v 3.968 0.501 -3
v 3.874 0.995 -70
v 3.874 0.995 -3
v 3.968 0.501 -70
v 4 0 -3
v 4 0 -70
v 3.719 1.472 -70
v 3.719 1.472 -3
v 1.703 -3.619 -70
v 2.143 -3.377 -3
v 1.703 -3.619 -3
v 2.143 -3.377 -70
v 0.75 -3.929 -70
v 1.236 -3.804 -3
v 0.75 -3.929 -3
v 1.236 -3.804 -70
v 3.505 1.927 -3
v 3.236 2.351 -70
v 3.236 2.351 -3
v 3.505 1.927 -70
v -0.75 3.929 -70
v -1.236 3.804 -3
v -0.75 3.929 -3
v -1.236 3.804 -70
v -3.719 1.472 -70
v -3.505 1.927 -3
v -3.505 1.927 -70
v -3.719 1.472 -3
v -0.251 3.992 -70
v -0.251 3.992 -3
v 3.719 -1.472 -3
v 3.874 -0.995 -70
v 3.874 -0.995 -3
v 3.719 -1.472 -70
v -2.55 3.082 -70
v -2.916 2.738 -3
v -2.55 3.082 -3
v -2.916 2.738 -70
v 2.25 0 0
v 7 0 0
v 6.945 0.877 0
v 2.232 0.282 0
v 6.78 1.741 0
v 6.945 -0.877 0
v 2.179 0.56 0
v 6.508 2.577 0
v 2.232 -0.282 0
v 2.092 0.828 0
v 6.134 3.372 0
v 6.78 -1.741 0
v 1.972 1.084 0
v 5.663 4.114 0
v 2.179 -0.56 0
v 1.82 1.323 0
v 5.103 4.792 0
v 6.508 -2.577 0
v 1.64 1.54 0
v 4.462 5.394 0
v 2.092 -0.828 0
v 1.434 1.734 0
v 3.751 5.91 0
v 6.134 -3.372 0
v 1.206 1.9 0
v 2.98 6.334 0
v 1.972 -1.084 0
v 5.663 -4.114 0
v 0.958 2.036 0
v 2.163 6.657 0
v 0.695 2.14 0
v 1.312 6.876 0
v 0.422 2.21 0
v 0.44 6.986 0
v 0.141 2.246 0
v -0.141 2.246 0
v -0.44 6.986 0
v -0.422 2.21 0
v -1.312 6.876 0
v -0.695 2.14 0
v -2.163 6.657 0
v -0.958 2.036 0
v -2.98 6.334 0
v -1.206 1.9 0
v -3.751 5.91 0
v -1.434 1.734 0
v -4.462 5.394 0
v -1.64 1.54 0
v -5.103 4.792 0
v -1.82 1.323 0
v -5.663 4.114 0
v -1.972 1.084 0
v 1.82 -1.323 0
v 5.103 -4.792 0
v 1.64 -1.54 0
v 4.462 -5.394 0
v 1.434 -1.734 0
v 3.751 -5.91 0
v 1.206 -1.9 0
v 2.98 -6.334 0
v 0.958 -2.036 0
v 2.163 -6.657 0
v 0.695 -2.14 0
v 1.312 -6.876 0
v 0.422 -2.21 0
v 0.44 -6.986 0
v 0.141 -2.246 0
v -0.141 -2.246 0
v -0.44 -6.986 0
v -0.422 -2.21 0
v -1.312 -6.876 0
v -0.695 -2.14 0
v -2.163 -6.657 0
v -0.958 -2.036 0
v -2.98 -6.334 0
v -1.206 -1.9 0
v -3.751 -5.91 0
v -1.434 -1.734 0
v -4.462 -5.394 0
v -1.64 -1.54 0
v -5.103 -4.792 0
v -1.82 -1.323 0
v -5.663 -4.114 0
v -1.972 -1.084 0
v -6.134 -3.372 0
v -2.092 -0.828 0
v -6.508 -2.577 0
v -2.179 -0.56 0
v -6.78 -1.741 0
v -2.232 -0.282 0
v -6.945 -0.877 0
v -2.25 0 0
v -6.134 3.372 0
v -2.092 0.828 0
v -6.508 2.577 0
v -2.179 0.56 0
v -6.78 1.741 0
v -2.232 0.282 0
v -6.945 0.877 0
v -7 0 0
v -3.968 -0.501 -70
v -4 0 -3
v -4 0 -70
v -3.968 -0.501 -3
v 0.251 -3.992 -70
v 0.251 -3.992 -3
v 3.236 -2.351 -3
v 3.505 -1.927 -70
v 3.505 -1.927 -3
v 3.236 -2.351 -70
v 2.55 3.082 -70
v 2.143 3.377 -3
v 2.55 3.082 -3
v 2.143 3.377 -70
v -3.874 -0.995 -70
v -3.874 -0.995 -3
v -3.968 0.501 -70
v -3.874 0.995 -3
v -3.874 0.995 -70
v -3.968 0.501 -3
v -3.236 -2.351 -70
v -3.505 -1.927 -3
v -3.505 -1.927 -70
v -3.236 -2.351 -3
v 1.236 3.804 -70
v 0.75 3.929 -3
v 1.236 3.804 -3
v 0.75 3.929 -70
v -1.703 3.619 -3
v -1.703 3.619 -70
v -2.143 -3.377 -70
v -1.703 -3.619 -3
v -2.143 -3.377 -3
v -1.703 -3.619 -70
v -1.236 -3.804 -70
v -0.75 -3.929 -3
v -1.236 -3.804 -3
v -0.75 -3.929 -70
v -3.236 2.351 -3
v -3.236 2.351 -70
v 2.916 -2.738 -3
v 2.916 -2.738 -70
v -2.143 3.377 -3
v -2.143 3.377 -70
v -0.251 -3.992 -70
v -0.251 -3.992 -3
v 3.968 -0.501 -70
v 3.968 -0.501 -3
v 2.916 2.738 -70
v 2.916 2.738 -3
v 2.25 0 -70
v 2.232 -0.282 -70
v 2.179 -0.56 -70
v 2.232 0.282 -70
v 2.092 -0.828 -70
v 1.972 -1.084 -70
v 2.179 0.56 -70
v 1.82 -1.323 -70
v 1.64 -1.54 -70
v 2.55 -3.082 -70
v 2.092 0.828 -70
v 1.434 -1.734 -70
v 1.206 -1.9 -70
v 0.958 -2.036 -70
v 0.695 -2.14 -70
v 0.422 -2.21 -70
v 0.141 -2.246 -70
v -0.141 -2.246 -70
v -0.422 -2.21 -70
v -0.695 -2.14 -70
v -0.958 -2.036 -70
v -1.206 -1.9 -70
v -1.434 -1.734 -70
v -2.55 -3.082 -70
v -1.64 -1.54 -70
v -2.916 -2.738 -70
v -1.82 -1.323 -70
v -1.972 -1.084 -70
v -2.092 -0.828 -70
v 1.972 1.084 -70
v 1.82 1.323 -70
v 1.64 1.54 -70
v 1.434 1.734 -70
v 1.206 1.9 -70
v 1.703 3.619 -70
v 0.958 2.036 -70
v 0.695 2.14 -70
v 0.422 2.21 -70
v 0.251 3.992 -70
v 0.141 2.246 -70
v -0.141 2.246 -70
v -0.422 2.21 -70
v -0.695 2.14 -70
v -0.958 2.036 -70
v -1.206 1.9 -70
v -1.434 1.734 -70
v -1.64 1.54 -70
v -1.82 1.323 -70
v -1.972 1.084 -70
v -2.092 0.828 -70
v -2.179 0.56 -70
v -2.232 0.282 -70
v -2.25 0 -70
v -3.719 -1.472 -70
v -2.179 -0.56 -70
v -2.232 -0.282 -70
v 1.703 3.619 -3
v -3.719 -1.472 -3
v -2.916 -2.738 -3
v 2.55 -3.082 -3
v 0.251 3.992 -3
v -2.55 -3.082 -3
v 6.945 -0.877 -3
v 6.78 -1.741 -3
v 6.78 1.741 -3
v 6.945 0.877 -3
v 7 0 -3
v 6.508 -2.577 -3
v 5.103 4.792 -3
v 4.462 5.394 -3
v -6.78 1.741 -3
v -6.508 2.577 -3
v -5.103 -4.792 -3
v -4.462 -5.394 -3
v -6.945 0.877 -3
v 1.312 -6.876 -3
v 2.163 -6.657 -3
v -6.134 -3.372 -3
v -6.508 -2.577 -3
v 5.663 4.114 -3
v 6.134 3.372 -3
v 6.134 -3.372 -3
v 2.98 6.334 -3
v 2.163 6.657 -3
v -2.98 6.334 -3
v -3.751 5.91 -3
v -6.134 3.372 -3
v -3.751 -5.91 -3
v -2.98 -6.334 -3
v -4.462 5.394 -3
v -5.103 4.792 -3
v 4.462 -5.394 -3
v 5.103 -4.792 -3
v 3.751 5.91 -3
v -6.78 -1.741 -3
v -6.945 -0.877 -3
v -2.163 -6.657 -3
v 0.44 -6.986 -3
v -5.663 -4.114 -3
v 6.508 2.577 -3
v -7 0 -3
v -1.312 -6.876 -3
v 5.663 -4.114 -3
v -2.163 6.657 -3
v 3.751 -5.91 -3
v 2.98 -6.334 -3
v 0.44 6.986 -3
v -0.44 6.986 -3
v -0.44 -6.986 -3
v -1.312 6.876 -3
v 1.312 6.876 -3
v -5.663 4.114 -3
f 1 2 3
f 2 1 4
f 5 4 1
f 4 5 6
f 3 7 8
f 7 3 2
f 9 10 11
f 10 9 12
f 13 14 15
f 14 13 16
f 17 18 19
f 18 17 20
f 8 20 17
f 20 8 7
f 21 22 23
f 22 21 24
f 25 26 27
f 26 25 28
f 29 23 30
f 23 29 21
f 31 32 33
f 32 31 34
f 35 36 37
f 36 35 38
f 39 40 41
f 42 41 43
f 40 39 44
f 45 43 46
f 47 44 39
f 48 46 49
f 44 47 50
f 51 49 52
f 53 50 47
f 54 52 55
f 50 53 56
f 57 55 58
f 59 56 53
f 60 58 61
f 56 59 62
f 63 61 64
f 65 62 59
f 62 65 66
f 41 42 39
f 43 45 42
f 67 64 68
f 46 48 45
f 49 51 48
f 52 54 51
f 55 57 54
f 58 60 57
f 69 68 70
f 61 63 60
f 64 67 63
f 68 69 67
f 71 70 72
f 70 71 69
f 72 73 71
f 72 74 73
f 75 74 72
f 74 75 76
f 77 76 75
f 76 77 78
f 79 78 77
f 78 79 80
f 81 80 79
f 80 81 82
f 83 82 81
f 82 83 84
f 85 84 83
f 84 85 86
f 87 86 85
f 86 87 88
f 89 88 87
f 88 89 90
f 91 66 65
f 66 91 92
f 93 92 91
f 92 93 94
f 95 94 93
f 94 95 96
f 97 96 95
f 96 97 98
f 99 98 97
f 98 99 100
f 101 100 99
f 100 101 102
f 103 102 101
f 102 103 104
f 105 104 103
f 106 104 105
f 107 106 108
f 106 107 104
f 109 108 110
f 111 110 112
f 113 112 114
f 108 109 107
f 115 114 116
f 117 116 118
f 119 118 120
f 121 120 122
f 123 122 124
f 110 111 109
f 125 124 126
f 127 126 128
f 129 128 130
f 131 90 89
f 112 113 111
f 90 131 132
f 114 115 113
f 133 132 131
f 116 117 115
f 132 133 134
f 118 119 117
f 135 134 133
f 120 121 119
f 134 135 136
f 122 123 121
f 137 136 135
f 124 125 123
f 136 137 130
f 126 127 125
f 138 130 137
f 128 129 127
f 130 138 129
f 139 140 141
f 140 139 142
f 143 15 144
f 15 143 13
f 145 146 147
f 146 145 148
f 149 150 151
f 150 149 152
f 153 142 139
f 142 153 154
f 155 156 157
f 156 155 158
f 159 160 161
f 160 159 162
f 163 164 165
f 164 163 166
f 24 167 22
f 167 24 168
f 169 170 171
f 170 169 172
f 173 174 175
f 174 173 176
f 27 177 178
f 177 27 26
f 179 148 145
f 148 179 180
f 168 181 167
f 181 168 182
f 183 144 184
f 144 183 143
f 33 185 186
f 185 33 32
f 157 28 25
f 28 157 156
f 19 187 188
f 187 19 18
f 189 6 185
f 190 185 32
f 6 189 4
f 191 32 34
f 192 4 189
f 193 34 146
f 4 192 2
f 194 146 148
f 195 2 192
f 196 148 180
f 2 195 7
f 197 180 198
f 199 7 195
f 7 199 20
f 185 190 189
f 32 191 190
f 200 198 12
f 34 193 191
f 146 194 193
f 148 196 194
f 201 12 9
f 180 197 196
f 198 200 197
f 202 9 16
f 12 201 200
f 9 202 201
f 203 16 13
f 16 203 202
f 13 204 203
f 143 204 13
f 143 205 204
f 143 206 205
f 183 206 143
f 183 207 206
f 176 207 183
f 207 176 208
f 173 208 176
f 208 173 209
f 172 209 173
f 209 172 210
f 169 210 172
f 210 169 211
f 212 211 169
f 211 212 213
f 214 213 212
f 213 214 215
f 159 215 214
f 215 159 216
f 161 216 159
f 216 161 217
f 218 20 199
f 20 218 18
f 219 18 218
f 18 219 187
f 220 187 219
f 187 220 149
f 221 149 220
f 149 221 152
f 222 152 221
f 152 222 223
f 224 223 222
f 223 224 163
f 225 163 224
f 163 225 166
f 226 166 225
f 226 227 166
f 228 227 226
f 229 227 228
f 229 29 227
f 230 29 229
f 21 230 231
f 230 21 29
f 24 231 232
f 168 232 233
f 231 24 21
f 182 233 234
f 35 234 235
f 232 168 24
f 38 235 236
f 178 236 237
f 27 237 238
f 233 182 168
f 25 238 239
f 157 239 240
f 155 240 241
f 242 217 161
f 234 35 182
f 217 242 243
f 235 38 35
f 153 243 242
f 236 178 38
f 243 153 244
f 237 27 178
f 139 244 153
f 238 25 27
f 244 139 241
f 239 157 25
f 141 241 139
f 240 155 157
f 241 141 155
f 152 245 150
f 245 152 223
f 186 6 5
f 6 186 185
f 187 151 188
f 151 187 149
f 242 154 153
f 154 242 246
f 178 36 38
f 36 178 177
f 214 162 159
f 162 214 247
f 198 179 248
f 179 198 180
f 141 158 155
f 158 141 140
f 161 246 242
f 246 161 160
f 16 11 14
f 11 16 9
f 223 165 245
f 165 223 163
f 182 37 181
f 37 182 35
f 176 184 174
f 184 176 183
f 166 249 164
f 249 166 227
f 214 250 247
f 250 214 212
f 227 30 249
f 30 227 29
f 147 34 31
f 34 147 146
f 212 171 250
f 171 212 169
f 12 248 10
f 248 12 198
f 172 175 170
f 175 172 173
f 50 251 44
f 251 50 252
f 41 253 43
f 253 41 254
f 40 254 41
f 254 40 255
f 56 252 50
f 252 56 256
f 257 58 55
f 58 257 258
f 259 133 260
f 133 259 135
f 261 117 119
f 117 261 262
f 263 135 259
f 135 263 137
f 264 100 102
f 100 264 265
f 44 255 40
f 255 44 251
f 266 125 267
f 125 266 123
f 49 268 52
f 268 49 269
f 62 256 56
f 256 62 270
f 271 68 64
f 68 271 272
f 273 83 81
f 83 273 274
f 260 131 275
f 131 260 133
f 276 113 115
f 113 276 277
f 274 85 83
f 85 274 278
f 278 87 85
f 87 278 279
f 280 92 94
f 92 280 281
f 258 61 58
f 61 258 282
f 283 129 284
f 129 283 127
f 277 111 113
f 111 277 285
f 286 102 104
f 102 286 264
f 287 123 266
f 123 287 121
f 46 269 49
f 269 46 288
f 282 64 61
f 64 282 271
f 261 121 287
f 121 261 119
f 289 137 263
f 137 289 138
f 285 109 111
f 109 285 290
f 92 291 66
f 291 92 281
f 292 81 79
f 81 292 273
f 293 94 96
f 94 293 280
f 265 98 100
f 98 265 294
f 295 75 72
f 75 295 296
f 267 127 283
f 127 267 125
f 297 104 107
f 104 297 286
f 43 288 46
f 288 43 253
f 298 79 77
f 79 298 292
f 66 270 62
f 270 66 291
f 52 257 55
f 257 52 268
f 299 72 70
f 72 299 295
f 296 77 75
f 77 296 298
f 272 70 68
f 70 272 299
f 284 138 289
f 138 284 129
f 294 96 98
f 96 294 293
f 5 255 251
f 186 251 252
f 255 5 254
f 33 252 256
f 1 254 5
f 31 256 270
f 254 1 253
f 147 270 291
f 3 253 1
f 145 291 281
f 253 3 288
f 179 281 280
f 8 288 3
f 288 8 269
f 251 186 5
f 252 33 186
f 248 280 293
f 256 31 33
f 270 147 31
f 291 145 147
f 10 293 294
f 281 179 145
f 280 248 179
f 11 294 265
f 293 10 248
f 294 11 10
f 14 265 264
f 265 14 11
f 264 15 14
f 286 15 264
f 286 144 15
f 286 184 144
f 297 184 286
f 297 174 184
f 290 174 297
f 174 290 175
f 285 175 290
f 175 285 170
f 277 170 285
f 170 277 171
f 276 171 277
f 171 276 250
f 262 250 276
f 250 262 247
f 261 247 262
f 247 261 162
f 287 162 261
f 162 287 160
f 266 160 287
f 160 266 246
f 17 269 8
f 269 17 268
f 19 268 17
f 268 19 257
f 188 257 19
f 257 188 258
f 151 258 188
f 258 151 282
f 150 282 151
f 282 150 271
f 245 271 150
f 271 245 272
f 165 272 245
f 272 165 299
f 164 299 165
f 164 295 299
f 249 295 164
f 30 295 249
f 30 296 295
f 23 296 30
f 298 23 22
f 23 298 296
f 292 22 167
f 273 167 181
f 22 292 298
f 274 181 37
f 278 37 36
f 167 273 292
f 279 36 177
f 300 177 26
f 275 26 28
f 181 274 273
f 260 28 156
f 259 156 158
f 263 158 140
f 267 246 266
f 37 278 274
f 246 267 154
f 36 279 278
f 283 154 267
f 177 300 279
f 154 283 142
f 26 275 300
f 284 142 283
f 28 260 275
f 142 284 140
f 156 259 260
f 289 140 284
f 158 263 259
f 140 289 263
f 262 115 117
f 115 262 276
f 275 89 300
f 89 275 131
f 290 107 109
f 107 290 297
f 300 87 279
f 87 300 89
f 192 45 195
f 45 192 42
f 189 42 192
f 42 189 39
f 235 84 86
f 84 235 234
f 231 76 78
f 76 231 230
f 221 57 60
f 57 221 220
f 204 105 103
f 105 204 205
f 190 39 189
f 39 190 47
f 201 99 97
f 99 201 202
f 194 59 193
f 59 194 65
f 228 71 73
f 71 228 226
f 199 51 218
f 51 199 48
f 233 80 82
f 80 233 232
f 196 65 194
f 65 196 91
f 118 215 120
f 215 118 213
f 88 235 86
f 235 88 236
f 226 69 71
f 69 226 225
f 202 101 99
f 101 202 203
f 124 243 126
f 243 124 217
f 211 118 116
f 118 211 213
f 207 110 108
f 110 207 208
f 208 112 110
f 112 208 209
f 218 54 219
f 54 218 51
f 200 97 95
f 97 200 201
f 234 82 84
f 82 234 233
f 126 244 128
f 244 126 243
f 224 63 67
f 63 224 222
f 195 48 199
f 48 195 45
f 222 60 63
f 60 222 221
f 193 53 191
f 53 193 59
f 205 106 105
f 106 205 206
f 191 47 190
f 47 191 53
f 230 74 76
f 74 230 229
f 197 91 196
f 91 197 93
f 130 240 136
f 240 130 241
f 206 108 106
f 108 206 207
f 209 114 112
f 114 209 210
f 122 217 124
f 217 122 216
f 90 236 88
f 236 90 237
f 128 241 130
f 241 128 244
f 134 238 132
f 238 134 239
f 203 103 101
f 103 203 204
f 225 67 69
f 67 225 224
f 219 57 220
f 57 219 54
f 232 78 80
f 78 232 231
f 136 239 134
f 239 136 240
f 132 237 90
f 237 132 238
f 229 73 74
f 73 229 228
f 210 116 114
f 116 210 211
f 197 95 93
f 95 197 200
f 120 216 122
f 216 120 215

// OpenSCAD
$fn = 50;


difference() {
	union() {
		translate(v = [0, 0, -70.0000000000]) {
			cylinder(h = 70, r = 4.0000000000);
		}
		translate(v = [0, 0, -3.0000000000]) {
			cylinder(h = 3, r = 7.0000000000);
		}
	}
	union() {
		#translate(v = [0, 0, -70]) {
			cylinder(h = 70, r = 2.2500000000);
		}
	}
}
